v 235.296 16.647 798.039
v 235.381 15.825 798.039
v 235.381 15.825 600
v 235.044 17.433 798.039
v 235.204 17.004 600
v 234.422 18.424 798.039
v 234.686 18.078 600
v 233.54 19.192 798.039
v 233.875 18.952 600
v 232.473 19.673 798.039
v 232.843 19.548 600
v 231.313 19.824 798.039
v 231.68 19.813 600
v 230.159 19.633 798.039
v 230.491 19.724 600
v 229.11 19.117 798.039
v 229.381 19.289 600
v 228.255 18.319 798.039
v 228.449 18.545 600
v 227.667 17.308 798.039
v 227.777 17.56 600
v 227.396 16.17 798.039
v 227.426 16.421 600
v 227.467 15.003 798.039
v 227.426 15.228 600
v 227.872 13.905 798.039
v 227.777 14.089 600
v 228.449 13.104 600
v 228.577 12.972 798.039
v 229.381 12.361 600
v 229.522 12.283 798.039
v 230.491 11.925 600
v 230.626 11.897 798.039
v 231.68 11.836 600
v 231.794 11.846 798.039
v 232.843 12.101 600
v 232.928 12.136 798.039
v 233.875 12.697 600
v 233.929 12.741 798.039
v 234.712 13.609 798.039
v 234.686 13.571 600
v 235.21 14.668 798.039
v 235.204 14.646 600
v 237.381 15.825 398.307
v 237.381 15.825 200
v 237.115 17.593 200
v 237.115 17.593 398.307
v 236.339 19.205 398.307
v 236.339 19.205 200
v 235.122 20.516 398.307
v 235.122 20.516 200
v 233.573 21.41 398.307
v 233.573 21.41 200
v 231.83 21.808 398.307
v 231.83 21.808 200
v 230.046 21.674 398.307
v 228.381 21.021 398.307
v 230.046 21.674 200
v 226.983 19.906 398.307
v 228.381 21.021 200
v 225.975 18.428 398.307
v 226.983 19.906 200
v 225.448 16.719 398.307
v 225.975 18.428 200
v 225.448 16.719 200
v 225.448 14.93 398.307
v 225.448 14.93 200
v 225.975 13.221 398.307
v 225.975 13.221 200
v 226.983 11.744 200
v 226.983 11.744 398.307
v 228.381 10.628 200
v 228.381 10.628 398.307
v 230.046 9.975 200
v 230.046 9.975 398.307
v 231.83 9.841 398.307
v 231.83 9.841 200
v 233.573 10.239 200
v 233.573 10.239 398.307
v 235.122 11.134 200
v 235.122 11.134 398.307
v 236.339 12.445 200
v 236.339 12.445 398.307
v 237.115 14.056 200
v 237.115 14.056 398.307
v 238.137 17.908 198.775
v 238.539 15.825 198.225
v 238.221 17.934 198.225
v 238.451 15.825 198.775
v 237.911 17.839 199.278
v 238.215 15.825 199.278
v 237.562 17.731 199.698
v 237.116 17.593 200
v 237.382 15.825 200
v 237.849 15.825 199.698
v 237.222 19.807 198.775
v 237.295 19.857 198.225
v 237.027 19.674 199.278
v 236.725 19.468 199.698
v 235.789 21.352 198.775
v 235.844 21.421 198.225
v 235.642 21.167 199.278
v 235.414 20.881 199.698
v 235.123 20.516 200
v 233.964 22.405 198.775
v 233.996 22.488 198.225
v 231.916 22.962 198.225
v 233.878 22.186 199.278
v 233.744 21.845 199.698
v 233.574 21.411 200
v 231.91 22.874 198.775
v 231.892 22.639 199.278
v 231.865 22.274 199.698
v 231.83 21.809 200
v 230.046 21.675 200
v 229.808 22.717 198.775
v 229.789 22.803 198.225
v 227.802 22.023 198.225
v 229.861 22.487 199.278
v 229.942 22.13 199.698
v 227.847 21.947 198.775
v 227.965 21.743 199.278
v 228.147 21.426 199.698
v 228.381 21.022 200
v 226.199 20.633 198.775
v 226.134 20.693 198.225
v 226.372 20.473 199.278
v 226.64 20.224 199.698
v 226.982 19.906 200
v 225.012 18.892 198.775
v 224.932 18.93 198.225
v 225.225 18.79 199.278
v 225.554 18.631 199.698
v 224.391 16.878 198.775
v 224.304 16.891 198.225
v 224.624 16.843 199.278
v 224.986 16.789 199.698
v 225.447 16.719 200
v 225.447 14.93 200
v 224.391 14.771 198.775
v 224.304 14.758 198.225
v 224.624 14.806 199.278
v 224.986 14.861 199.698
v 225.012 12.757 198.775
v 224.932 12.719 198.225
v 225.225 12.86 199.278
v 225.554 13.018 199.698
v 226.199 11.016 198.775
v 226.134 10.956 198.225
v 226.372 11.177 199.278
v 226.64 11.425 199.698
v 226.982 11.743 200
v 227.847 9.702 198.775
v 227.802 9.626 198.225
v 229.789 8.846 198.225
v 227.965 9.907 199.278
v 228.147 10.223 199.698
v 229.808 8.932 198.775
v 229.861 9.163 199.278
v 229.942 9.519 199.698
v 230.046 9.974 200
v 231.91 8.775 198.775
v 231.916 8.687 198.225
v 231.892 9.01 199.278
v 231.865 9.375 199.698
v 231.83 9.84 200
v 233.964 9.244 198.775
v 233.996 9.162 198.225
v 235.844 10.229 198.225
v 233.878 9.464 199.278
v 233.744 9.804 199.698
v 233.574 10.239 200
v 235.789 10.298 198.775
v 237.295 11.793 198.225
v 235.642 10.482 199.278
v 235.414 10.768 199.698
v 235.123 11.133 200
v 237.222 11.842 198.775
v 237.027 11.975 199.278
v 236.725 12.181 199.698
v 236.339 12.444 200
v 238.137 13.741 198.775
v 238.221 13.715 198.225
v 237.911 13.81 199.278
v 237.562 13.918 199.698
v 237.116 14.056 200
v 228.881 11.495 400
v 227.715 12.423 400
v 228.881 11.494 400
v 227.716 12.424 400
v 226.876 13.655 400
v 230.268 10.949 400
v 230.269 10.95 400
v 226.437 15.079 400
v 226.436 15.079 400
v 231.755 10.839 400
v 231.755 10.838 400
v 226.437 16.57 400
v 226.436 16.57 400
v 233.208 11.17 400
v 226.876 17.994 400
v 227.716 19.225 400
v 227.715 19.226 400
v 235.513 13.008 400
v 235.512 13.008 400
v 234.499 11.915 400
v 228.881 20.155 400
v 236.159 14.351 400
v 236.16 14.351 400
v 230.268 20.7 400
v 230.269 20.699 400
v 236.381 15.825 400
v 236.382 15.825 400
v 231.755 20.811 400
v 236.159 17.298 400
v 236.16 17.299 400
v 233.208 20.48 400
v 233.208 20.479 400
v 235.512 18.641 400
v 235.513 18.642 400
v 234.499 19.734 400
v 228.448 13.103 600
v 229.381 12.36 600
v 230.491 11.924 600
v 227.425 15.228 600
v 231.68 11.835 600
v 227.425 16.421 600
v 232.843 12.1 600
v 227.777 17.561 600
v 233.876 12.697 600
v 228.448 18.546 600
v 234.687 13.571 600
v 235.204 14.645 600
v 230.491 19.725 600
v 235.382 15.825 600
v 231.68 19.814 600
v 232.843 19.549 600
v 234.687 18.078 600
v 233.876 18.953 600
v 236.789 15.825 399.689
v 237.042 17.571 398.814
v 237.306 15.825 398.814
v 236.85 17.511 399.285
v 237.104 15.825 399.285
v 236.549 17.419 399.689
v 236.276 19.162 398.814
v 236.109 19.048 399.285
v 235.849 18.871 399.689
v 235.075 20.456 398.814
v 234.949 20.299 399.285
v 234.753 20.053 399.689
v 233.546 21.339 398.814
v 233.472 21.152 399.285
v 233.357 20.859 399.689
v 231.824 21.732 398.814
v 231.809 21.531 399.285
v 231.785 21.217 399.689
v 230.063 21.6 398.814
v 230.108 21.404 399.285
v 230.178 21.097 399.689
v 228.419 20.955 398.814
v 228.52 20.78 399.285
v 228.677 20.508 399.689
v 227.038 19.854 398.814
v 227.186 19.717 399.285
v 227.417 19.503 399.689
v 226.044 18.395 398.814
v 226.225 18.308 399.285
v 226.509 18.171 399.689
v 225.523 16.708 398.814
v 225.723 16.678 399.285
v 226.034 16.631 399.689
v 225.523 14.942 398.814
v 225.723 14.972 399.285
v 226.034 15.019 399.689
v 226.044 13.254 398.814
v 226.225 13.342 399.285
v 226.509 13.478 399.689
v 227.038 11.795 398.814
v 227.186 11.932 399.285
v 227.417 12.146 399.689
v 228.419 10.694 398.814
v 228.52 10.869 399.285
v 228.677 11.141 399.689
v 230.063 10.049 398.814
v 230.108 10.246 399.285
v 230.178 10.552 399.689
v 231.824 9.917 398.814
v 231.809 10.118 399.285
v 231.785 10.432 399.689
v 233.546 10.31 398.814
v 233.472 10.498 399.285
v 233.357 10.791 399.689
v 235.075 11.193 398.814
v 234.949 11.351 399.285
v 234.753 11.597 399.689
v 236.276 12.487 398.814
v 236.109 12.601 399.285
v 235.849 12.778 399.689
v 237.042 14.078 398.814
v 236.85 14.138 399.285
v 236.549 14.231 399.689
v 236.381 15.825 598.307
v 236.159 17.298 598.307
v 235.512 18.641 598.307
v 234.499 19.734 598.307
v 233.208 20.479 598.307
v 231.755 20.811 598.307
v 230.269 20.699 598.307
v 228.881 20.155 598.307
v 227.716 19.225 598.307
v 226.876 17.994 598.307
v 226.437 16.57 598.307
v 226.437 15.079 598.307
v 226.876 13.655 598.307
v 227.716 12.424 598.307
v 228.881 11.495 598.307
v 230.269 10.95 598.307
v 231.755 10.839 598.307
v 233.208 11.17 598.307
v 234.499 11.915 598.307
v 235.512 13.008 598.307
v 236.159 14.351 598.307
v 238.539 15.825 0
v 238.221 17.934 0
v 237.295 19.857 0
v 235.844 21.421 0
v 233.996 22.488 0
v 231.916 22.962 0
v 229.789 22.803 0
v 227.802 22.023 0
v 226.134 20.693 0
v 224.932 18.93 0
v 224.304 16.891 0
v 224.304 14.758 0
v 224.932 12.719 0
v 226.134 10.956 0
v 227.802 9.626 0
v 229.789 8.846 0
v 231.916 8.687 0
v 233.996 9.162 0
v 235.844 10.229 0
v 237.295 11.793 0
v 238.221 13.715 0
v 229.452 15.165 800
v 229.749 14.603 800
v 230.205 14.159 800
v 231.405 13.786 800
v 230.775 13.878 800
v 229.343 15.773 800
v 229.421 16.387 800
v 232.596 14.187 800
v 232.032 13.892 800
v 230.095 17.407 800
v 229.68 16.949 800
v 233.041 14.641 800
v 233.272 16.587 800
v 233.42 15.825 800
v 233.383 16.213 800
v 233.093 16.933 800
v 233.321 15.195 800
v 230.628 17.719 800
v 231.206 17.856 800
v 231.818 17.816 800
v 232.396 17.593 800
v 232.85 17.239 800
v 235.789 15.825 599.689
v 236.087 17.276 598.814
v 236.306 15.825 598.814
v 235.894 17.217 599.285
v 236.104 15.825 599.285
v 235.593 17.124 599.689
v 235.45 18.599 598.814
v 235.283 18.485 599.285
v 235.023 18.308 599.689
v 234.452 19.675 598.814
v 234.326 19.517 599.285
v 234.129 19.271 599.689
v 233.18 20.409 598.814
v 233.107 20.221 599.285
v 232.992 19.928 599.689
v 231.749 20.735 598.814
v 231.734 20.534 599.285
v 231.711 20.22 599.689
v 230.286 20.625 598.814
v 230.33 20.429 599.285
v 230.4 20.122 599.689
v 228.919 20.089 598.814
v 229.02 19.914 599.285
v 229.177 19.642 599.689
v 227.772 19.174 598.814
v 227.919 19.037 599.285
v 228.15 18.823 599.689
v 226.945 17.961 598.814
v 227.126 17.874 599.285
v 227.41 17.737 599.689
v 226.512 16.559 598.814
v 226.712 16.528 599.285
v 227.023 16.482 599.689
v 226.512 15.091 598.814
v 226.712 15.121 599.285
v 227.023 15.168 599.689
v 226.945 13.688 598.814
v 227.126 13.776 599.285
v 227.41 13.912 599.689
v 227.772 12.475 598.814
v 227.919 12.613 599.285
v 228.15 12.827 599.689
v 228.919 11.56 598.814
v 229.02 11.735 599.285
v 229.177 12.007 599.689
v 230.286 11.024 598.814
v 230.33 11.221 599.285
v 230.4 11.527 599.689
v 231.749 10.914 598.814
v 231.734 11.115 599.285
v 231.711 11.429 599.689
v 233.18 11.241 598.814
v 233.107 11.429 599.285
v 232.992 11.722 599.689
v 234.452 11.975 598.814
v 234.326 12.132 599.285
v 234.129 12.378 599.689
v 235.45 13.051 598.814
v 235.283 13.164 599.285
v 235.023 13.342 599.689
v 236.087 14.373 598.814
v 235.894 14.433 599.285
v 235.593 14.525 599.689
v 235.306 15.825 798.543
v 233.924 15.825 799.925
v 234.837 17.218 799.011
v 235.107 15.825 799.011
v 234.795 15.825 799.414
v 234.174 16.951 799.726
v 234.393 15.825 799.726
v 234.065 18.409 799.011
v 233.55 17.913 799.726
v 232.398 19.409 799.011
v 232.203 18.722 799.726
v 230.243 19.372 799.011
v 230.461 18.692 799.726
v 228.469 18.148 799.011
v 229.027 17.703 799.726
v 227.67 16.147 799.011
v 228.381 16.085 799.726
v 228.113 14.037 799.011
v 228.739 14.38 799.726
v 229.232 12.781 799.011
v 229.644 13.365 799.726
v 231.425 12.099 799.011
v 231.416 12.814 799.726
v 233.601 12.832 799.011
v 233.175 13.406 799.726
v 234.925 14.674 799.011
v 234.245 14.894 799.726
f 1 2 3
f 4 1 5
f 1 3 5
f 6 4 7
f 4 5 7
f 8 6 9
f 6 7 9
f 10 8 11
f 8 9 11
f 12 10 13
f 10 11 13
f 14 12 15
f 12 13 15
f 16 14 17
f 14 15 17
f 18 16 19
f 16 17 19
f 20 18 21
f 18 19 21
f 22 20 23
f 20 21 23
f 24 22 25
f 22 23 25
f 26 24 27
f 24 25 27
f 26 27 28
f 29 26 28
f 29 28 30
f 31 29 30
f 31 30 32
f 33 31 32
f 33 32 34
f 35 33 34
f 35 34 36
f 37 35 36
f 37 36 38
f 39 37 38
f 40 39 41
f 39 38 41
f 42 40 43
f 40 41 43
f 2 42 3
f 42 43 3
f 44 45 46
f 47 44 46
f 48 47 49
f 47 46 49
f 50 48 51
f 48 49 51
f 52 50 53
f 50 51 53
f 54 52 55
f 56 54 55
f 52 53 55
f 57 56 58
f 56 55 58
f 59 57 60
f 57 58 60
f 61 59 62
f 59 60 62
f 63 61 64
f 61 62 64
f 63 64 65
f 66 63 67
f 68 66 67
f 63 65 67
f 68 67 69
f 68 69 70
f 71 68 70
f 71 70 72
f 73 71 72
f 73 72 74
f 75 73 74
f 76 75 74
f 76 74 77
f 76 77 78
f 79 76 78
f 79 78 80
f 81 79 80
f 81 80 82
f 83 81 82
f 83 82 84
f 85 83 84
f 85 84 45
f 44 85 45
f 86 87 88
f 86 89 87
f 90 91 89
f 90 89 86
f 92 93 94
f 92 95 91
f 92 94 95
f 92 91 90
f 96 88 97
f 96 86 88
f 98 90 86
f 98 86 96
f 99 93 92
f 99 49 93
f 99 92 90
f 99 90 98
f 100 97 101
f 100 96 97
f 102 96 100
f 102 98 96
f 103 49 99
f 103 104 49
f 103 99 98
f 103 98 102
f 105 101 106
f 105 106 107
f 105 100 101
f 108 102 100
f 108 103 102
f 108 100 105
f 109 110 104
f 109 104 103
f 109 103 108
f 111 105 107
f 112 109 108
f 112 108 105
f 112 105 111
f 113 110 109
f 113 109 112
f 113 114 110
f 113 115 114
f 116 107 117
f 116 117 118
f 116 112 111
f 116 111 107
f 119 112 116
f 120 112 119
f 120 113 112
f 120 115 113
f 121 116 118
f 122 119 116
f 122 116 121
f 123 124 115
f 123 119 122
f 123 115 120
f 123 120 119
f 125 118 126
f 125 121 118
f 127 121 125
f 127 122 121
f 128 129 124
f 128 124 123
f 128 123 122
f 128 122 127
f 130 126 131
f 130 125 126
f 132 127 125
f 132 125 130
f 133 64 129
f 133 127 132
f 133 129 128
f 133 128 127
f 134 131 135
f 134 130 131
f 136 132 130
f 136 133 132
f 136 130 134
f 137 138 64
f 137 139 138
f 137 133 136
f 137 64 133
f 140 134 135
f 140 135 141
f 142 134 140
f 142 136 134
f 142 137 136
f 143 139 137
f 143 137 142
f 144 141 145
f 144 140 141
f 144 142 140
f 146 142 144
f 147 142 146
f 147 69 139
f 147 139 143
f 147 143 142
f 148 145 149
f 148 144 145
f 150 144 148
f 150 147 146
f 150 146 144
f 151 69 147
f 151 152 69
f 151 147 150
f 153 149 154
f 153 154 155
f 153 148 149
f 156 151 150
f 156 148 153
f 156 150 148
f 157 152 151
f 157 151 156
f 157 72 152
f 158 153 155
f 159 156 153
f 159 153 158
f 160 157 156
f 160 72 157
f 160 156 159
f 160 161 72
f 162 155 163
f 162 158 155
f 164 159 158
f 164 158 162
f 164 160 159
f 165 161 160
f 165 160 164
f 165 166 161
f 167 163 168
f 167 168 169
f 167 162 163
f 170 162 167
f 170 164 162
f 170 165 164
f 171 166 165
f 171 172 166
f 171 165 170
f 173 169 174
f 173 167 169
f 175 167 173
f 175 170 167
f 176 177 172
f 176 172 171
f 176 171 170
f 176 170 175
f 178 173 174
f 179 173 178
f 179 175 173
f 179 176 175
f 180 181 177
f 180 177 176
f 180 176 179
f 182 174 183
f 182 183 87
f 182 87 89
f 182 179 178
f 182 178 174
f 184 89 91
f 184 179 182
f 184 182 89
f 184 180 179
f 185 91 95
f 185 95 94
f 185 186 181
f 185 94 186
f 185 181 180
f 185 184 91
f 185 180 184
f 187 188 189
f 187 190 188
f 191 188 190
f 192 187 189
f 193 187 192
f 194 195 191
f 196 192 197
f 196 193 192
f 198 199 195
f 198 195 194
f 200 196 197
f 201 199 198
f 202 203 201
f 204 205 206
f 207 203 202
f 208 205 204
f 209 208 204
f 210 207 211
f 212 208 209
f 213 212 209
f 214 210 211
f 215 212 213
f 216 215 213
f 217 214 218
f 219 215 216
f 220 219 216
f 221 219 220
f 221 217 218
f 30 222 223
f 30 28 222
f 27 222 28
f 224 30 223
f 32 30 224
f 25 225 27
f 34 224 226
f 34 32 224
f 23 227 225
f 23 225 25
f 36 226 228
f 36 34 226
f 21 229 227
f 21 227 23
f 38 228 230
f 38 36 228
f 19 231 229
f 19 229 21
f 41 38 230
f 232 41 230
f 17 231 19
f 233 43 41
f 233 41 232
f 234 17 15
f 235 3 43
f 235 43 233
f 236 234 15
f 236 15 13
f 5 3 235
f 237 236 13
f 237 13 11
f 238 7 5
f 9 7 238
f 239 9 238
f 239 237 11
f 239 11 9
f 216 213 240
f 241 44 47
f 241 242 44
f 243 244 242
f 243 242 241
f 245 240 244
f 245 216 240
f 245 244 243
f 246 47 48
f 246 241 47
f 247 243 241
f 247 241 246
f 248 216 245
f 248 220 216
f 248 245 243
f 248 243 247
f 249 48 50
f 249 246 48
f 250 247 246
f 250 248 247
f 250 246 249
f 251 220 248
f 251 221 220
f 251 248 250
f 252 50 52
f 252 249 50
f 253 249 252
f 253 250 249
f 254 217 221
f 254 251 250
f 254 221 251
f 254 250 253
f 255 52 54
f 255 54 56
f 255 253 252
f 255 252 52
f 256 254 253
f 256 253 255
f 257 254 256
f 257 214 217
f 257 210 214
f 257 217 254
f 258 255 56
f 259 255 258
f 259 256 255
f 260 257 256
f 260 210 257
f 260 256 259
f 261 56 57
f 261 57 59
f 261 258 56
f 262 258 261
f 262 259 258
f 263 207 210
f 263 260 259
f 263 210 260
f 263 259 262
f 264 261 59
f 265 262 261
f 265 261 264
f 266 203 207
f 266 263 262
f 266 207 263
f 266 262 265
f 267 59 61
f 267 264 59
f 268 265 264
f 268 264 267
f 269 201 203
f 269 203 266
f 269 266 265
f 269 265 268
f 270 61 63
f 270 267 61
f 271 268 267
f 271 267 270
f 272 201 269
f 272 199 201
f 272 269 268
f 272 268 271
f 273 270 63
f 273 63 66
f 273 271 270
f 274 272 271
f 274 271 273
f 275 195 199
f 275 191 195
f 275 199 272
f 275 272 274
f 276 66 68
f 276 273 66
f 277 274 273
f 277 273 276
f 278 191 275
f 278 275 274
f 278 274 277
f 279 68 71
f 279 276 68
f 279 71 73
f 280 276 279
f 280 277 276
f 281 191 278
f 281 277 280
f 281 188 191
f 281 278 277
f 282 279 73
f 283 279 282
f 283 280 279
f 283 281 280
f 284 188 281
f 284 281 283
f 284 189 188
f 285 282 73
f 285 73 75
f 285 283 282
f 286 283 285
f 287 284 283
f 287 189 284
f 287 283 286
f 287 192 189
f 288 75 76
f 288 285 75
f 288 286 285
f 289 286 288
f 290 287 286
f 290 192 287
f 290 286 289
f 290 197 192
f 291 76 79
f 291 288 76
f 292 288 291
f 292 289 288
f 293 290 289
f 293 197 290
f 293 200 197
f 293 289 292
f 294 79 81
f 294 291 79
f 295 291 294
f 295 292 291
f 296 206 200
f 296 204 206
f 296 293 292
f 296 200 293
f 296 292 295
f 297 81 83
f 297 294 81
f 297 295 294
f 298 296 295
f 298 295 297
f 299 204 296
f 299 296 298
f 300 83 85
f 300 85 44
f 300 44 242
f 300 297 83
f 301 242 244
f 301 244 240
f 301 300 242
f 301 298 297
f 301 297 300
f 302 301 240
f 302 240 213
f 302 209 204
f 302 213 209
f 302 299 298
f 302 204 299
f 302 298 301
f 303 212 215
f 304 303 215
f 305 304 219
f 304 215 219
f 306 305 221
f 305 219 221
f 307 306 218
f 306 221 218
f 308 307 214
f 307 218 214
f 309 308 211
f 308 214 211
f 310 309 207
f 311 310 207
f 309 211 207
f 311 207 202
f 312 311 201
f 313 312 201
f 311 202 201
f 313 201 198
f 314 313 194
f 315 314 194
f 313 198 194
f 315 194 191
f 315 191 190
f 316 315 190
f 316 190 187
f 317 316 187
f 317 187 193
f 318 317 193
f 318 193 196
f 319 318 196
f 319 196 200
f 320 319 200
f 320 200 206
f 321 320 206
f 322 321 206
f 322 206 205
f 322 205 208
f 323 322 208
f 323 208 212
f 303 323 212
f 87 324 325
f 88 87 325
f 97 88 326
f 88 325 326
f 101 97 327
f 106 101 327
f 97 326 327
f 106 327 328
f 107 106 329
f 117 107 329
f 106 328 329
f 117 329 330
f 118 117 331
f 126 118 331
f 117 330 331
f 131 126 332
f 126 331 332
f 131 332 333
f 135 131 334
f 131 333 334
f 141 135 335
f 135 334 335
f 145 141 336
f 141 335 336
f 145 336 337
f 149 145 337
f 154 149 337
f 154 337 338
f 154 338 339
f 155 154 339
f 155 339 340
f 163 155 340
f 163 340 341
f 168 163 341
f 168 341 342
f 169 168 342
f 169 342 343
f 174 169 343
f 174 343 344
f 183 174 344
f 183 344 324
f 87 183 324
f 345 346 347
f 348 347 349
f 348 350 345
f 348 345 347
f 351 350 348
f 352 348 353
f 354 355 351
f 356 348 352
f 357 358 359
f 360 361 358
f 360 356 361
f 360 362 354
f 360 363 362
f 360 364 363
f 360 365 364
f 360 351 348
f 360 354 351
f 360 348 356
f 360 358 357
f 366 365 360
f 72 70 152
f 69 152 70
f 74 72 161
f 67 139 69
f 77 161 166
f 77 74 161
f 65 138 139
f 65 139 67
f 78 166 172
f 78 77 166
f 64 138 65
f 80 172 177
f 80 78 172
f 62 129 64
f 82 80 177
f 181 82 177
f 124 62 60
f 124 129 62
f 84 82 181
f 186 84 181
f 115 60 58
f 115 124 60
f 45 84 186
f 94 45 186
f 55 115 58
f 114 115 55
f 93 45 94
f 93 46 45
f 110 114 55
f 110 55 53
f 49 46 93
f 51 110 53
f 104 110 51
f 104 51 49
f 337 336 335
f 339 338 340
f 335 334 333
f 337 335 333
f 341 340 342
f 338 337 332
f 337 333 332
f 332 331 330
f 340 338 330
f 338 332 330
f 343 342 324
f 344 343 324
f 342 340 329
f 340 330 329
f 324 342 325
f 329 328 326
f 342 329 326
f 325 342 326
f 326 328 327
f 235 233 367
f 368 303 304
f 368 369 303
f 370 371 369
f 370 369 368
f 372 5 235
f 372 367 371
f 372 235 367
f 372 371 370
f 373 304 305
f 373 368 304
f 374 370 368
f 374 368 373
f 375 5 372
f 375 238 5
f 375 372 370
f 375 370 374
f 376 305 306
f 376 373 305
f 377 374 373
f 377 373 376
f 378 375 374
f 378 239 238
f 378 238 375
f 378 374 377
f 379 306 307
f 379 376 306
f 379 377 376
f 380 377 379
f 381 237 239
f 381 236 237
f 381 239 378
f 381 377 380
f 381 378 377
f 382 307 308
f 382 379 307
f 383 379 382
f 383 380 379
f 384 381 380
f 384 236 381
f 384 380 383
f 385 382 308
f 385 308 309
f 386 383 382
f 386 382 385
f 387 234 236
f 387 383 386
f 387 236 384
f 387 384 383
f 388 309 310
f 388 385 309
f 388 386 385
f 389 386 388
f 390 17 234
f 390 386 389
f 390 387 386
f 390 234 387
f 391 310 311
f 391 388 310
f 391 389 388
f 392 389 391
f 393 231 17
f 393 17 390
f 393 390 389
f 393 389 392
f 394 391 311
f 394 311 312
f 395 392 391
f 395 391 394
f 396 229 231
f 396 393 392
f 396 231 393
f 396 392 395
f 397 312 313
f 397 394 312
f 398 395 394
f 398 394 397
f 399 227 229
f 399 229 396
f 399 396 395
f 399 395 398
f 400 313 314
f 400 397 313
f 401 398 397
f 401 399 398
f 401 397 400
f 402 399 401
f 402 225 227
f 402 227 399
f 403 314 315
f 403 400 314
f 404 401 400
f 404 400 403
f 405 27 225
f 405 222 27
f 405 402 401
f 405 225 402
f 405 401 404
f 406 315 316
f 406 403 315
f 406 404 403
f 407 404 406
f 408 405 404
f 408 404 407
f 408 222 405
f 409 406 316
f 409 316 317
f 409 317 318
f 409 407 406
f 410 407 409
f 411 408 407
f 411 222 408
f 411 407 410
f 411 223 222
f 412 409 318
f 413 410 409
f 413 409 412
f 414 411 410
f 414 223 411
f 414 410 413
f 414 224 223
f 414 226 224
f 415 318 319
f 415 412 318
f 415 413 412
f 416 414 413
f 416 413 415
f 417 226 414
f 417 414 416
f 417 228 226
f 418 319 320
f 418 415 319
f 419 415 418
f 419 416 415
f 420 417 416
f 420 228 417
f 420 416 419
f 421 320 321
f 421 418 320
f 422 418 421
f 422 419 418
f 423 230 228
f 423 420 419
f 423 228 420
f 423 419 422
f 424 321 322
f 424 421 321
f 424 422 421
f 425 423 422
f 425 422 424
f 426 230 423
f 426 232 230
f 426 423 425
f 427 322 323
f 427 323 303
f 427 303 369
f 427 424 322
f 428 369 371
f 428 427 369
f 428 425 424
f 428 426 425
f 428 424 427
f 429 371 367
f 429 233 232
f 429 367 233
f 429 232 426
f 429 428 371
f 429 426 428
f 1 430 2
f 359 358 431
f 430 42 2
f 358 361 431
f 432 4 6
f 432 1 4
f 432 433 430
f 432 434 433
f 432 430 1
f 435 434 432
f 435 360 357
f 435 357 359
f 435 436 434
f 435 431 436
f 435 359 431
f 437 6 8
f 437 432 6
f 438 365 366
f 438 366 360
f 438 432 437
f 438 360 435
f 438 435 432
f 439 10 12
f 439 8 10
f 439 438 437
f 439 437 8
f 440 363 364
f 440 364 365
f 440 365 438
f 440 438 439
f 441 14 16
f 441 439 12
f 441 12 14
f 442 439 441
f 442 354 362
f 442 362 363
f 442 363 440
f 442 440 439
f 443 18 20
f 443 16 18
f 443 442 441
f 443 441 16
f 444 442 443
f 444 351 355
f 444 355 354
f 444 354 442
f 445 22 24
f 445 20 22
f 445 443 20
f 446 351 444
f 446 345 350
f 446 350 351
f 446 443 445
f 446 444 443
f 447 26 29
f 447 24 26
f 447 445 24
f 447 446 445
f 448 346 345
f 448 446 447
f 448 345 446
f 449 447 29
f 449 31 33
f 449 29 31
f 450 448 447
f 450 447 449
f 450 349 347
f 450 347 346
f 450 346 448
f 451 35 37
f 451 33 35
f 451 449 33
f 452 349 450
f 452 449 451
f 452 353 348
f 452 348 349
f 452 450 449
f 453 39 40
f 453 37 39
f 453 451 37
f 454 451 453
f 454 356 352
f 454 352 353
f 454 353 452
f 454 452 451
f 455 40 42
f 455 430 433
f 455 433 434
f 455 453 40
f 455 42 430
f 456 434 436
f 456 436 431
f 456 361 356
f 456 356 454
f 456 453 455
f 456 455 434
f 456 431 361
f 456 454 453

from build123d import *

# Parameters (mm, degrees)
F0_R     = 7.1577178439
F0_R_2   = 6
F0_R_3   = 5
F0_R_4   = 4
F1_DEPTH = 200
F2_DEPTH = 400
F3_DEPTH = 600
F4_DEPTH = 800


# Not quite as in the source:
# - a fillet or chamfer that OpenCascade refuses, or shapes differently, is made with other operations: its cross-section is extruded or revolved along the edge and cut away or added


with BuildPart() as f1:
    # F0 (on Top) → F1 (new body)
    with BuildSketch(Plane.XY):
        with Locations((231.38127774, 15.8246317059)):
            Circle(F0_R)
        with Locations((231.38127774, 15.8246317059)):
            Circle(F0_R_2, mode=Mode.SUBTRACT)
        with Locations((231.38127774, 15.8246317059)):
            Circle(F0_R_2)
        with Locations((231.38127774, 15.8246317059)):
            Circle(F0_R_3, mode=Mode.SUBTRACT)
        with Locations((231.38127774, 15.8246317059)):
            Circle(F0_R_3)
        with Locations((231.38127774, 15.8246317059)):
            Circle(F0_R_4, mode=Mode.SUBTRACT)
        with Locations((231.38127774, 15.8246317059)):
            Circle(F0_R_4)
    extrude(amount=F1_DEPTH)

    # F0 (on Top) → F2 (join)
    with BuildSketch(Plane.XY):
        with Locations((231.38127774, 15.8246317059)):
            Circle(F0_R_2)
        with Locations((231.38127774, 15.8246317059)):
            Circle(F0_R_3, mode=Mode.SUBTRACT)
        with Locations((231.38127774, 15.8246317059)):
            Circle(F0_R_3)
        with Locations((231.38127774, 15.8246317059)):
            Circle(F0_R_4, mode=Mode.SUBTRACT)
        with Locations((231.38127774, 15.8246317059)):
            Circle(F0_R_4)
    extrude(amount=F2_DEPTH)

    # F0 (on Top) → F3 (join)
    with BuildSketch(Plane.XY):
        with Locations((231.38127774, 15.8246317059)):
            Circle(F0_R_3)
        with Locations((231.38127774, 15.8246317059)):
            Circle(F0_R_4, mode=Mode.SUBTRACT)
        with Locations((231.38127774, 15.8246317059)):
            Circle(F0_R_4)
    extrude(amount=F3_DEPTH)

    # F0 (on Top) → F4 (join)
    with BuildSketch(Plane.XY):
        with Locations((231.38127774, 15.8246317059)):
            Circle(F0_R_4)
    extrude(amount=F4_DEPTH)

    # F5: fillet of radius 2 on 4 edges, made by hand

    # F5_s1 → F5_t2 (revolve, cut)
    with BuildSketch(Plane.XZ.offset(-15.8246317059)):
        with BuildLine():
            ThreePointArc((238.5393955839, 198.1853934994), (238.2252538415, 199.261841349), (237.3814463082, 200.0003627462))
            Line((237.3814463082, 200.0003627462), (237.4657879491, 200.1818596708))
            ThreePointArc((237.4657879491, 200.1818596708), (237.9602209461, 200.2001365685), (238.5389955839, 200.2001365685))
            Line((238.5389955839, 200.2001365685), (238.7391321525, 200))
            ThreePointArc((238.7391321525, 200), (238.7391321525, 199.0926967497), (238.7395321525, 198.1853934994))
            Line((238.7395321525, 198.1853934994), (238.5393955839, 198.1853934994))
        make_face()
    revolve(axis=Axis((231.38127774, 15.8246317059, 200), (0, 0, 1)), mode=Mode.SUBTRACT)

    # F5_s3 → F5_t4 (revolve, cut)
    with BuildSketch(Plane.XZ.offset(-15.8246317059)):
        with BuildLine():
            ThreePointArc((237.38167774, 398.2673917434), (237.1136849874, 399.2678330874), (236.3814778365, 400.0003463544))
            Line((236.3814778365, 400.0003463544), (236.4815944147, 400.1736418155))
            ThreePointArc((236.4815944147, 400.1736418155), (236.8813777883, 400.2001365685), (237.38127774, 400.2001365685))
            Line((237.38127774, 400.2001365685), (237.5814143085, 400))
            ThreePointArc((237.5814143085, 400), (237.5814143085, 399.1336958717), (237.5818143085, 398.2673917434))
            Line((237.5818143085, 398.2673917434), (237.38167774, 398.2673917434))
        make_face()
    revolve(axis=Axis((231.38127774, 15.8246317059, 400), (0, 0, 1)), mode=Mode.SUBTRACT)

    # F5_s5 → F5_t6 (revolve, cut)
    with BuildSketch(Plane.XZ.offset(-15.8246317059)):
        with BuildLine():
            ThreePointArc((236.38167774, 598.2673917434), (236.1136849874, 599.2678330874), (235.3814778365, 600.0003463544))
            Line((235.3814778365, 600.0003463544), (235.4815944147, 600.1736418155))
            ThreePointArc((235.4815944147, 600.1736418155), (235.8813777883, 600.2001365685), (236.38127774, 600.2001365685))
            Line((236.38127774, 600.2001365685), (236.5814143085, 600))
            ThreePointArc((236.5814143085, 600), (236.5814143085, 599.1336958717), (236.5818143085, 598.2673917434))
            Line((236.5818143085, 598.2673917434), (236.38167774, 598.2673917434))
        make_face()
    revolve(axis=Axis((231.38127774, 15.8246317059, 600), (0, 0, 1)), mode=Mode.SUBTRACT)

    # F5_s7 → F5_t8 (revolve, cut)
    with BuildSketch(Plane.XZ.offset(-15.8246317059)):
        with BuildLine():
            ThreePointArc((235.38167774, 797.9990343146), (234.7954913024, 799.4142135624), (233.3803120546, 800.0004))
            Line((233.3803120546, 800.0004), (233.3803120546, 800.2005365685))
            ThreePointArc((233.3803120546, 800.2005365685), (234.3807948973, 800.2001365685), (235.38127774, 800.2001365685))
            Line((235.38127774, 800.2001365685), (235.5814143085, 800))
            ThreePointArc((235.5814143085, 800), (235.5814143085, 798.9995171573), (235.5818143085, 797.9990343146))
            Line((235.5818143085, 797.9990343146), (235.38167774, 797.9990343146))
        make_face()
    revolve(axis=Axis((231.38127774, 15.8246317059, 800), (0, 0, 1)), mode=Mode.SUBTRACT)


solid = f1.part
